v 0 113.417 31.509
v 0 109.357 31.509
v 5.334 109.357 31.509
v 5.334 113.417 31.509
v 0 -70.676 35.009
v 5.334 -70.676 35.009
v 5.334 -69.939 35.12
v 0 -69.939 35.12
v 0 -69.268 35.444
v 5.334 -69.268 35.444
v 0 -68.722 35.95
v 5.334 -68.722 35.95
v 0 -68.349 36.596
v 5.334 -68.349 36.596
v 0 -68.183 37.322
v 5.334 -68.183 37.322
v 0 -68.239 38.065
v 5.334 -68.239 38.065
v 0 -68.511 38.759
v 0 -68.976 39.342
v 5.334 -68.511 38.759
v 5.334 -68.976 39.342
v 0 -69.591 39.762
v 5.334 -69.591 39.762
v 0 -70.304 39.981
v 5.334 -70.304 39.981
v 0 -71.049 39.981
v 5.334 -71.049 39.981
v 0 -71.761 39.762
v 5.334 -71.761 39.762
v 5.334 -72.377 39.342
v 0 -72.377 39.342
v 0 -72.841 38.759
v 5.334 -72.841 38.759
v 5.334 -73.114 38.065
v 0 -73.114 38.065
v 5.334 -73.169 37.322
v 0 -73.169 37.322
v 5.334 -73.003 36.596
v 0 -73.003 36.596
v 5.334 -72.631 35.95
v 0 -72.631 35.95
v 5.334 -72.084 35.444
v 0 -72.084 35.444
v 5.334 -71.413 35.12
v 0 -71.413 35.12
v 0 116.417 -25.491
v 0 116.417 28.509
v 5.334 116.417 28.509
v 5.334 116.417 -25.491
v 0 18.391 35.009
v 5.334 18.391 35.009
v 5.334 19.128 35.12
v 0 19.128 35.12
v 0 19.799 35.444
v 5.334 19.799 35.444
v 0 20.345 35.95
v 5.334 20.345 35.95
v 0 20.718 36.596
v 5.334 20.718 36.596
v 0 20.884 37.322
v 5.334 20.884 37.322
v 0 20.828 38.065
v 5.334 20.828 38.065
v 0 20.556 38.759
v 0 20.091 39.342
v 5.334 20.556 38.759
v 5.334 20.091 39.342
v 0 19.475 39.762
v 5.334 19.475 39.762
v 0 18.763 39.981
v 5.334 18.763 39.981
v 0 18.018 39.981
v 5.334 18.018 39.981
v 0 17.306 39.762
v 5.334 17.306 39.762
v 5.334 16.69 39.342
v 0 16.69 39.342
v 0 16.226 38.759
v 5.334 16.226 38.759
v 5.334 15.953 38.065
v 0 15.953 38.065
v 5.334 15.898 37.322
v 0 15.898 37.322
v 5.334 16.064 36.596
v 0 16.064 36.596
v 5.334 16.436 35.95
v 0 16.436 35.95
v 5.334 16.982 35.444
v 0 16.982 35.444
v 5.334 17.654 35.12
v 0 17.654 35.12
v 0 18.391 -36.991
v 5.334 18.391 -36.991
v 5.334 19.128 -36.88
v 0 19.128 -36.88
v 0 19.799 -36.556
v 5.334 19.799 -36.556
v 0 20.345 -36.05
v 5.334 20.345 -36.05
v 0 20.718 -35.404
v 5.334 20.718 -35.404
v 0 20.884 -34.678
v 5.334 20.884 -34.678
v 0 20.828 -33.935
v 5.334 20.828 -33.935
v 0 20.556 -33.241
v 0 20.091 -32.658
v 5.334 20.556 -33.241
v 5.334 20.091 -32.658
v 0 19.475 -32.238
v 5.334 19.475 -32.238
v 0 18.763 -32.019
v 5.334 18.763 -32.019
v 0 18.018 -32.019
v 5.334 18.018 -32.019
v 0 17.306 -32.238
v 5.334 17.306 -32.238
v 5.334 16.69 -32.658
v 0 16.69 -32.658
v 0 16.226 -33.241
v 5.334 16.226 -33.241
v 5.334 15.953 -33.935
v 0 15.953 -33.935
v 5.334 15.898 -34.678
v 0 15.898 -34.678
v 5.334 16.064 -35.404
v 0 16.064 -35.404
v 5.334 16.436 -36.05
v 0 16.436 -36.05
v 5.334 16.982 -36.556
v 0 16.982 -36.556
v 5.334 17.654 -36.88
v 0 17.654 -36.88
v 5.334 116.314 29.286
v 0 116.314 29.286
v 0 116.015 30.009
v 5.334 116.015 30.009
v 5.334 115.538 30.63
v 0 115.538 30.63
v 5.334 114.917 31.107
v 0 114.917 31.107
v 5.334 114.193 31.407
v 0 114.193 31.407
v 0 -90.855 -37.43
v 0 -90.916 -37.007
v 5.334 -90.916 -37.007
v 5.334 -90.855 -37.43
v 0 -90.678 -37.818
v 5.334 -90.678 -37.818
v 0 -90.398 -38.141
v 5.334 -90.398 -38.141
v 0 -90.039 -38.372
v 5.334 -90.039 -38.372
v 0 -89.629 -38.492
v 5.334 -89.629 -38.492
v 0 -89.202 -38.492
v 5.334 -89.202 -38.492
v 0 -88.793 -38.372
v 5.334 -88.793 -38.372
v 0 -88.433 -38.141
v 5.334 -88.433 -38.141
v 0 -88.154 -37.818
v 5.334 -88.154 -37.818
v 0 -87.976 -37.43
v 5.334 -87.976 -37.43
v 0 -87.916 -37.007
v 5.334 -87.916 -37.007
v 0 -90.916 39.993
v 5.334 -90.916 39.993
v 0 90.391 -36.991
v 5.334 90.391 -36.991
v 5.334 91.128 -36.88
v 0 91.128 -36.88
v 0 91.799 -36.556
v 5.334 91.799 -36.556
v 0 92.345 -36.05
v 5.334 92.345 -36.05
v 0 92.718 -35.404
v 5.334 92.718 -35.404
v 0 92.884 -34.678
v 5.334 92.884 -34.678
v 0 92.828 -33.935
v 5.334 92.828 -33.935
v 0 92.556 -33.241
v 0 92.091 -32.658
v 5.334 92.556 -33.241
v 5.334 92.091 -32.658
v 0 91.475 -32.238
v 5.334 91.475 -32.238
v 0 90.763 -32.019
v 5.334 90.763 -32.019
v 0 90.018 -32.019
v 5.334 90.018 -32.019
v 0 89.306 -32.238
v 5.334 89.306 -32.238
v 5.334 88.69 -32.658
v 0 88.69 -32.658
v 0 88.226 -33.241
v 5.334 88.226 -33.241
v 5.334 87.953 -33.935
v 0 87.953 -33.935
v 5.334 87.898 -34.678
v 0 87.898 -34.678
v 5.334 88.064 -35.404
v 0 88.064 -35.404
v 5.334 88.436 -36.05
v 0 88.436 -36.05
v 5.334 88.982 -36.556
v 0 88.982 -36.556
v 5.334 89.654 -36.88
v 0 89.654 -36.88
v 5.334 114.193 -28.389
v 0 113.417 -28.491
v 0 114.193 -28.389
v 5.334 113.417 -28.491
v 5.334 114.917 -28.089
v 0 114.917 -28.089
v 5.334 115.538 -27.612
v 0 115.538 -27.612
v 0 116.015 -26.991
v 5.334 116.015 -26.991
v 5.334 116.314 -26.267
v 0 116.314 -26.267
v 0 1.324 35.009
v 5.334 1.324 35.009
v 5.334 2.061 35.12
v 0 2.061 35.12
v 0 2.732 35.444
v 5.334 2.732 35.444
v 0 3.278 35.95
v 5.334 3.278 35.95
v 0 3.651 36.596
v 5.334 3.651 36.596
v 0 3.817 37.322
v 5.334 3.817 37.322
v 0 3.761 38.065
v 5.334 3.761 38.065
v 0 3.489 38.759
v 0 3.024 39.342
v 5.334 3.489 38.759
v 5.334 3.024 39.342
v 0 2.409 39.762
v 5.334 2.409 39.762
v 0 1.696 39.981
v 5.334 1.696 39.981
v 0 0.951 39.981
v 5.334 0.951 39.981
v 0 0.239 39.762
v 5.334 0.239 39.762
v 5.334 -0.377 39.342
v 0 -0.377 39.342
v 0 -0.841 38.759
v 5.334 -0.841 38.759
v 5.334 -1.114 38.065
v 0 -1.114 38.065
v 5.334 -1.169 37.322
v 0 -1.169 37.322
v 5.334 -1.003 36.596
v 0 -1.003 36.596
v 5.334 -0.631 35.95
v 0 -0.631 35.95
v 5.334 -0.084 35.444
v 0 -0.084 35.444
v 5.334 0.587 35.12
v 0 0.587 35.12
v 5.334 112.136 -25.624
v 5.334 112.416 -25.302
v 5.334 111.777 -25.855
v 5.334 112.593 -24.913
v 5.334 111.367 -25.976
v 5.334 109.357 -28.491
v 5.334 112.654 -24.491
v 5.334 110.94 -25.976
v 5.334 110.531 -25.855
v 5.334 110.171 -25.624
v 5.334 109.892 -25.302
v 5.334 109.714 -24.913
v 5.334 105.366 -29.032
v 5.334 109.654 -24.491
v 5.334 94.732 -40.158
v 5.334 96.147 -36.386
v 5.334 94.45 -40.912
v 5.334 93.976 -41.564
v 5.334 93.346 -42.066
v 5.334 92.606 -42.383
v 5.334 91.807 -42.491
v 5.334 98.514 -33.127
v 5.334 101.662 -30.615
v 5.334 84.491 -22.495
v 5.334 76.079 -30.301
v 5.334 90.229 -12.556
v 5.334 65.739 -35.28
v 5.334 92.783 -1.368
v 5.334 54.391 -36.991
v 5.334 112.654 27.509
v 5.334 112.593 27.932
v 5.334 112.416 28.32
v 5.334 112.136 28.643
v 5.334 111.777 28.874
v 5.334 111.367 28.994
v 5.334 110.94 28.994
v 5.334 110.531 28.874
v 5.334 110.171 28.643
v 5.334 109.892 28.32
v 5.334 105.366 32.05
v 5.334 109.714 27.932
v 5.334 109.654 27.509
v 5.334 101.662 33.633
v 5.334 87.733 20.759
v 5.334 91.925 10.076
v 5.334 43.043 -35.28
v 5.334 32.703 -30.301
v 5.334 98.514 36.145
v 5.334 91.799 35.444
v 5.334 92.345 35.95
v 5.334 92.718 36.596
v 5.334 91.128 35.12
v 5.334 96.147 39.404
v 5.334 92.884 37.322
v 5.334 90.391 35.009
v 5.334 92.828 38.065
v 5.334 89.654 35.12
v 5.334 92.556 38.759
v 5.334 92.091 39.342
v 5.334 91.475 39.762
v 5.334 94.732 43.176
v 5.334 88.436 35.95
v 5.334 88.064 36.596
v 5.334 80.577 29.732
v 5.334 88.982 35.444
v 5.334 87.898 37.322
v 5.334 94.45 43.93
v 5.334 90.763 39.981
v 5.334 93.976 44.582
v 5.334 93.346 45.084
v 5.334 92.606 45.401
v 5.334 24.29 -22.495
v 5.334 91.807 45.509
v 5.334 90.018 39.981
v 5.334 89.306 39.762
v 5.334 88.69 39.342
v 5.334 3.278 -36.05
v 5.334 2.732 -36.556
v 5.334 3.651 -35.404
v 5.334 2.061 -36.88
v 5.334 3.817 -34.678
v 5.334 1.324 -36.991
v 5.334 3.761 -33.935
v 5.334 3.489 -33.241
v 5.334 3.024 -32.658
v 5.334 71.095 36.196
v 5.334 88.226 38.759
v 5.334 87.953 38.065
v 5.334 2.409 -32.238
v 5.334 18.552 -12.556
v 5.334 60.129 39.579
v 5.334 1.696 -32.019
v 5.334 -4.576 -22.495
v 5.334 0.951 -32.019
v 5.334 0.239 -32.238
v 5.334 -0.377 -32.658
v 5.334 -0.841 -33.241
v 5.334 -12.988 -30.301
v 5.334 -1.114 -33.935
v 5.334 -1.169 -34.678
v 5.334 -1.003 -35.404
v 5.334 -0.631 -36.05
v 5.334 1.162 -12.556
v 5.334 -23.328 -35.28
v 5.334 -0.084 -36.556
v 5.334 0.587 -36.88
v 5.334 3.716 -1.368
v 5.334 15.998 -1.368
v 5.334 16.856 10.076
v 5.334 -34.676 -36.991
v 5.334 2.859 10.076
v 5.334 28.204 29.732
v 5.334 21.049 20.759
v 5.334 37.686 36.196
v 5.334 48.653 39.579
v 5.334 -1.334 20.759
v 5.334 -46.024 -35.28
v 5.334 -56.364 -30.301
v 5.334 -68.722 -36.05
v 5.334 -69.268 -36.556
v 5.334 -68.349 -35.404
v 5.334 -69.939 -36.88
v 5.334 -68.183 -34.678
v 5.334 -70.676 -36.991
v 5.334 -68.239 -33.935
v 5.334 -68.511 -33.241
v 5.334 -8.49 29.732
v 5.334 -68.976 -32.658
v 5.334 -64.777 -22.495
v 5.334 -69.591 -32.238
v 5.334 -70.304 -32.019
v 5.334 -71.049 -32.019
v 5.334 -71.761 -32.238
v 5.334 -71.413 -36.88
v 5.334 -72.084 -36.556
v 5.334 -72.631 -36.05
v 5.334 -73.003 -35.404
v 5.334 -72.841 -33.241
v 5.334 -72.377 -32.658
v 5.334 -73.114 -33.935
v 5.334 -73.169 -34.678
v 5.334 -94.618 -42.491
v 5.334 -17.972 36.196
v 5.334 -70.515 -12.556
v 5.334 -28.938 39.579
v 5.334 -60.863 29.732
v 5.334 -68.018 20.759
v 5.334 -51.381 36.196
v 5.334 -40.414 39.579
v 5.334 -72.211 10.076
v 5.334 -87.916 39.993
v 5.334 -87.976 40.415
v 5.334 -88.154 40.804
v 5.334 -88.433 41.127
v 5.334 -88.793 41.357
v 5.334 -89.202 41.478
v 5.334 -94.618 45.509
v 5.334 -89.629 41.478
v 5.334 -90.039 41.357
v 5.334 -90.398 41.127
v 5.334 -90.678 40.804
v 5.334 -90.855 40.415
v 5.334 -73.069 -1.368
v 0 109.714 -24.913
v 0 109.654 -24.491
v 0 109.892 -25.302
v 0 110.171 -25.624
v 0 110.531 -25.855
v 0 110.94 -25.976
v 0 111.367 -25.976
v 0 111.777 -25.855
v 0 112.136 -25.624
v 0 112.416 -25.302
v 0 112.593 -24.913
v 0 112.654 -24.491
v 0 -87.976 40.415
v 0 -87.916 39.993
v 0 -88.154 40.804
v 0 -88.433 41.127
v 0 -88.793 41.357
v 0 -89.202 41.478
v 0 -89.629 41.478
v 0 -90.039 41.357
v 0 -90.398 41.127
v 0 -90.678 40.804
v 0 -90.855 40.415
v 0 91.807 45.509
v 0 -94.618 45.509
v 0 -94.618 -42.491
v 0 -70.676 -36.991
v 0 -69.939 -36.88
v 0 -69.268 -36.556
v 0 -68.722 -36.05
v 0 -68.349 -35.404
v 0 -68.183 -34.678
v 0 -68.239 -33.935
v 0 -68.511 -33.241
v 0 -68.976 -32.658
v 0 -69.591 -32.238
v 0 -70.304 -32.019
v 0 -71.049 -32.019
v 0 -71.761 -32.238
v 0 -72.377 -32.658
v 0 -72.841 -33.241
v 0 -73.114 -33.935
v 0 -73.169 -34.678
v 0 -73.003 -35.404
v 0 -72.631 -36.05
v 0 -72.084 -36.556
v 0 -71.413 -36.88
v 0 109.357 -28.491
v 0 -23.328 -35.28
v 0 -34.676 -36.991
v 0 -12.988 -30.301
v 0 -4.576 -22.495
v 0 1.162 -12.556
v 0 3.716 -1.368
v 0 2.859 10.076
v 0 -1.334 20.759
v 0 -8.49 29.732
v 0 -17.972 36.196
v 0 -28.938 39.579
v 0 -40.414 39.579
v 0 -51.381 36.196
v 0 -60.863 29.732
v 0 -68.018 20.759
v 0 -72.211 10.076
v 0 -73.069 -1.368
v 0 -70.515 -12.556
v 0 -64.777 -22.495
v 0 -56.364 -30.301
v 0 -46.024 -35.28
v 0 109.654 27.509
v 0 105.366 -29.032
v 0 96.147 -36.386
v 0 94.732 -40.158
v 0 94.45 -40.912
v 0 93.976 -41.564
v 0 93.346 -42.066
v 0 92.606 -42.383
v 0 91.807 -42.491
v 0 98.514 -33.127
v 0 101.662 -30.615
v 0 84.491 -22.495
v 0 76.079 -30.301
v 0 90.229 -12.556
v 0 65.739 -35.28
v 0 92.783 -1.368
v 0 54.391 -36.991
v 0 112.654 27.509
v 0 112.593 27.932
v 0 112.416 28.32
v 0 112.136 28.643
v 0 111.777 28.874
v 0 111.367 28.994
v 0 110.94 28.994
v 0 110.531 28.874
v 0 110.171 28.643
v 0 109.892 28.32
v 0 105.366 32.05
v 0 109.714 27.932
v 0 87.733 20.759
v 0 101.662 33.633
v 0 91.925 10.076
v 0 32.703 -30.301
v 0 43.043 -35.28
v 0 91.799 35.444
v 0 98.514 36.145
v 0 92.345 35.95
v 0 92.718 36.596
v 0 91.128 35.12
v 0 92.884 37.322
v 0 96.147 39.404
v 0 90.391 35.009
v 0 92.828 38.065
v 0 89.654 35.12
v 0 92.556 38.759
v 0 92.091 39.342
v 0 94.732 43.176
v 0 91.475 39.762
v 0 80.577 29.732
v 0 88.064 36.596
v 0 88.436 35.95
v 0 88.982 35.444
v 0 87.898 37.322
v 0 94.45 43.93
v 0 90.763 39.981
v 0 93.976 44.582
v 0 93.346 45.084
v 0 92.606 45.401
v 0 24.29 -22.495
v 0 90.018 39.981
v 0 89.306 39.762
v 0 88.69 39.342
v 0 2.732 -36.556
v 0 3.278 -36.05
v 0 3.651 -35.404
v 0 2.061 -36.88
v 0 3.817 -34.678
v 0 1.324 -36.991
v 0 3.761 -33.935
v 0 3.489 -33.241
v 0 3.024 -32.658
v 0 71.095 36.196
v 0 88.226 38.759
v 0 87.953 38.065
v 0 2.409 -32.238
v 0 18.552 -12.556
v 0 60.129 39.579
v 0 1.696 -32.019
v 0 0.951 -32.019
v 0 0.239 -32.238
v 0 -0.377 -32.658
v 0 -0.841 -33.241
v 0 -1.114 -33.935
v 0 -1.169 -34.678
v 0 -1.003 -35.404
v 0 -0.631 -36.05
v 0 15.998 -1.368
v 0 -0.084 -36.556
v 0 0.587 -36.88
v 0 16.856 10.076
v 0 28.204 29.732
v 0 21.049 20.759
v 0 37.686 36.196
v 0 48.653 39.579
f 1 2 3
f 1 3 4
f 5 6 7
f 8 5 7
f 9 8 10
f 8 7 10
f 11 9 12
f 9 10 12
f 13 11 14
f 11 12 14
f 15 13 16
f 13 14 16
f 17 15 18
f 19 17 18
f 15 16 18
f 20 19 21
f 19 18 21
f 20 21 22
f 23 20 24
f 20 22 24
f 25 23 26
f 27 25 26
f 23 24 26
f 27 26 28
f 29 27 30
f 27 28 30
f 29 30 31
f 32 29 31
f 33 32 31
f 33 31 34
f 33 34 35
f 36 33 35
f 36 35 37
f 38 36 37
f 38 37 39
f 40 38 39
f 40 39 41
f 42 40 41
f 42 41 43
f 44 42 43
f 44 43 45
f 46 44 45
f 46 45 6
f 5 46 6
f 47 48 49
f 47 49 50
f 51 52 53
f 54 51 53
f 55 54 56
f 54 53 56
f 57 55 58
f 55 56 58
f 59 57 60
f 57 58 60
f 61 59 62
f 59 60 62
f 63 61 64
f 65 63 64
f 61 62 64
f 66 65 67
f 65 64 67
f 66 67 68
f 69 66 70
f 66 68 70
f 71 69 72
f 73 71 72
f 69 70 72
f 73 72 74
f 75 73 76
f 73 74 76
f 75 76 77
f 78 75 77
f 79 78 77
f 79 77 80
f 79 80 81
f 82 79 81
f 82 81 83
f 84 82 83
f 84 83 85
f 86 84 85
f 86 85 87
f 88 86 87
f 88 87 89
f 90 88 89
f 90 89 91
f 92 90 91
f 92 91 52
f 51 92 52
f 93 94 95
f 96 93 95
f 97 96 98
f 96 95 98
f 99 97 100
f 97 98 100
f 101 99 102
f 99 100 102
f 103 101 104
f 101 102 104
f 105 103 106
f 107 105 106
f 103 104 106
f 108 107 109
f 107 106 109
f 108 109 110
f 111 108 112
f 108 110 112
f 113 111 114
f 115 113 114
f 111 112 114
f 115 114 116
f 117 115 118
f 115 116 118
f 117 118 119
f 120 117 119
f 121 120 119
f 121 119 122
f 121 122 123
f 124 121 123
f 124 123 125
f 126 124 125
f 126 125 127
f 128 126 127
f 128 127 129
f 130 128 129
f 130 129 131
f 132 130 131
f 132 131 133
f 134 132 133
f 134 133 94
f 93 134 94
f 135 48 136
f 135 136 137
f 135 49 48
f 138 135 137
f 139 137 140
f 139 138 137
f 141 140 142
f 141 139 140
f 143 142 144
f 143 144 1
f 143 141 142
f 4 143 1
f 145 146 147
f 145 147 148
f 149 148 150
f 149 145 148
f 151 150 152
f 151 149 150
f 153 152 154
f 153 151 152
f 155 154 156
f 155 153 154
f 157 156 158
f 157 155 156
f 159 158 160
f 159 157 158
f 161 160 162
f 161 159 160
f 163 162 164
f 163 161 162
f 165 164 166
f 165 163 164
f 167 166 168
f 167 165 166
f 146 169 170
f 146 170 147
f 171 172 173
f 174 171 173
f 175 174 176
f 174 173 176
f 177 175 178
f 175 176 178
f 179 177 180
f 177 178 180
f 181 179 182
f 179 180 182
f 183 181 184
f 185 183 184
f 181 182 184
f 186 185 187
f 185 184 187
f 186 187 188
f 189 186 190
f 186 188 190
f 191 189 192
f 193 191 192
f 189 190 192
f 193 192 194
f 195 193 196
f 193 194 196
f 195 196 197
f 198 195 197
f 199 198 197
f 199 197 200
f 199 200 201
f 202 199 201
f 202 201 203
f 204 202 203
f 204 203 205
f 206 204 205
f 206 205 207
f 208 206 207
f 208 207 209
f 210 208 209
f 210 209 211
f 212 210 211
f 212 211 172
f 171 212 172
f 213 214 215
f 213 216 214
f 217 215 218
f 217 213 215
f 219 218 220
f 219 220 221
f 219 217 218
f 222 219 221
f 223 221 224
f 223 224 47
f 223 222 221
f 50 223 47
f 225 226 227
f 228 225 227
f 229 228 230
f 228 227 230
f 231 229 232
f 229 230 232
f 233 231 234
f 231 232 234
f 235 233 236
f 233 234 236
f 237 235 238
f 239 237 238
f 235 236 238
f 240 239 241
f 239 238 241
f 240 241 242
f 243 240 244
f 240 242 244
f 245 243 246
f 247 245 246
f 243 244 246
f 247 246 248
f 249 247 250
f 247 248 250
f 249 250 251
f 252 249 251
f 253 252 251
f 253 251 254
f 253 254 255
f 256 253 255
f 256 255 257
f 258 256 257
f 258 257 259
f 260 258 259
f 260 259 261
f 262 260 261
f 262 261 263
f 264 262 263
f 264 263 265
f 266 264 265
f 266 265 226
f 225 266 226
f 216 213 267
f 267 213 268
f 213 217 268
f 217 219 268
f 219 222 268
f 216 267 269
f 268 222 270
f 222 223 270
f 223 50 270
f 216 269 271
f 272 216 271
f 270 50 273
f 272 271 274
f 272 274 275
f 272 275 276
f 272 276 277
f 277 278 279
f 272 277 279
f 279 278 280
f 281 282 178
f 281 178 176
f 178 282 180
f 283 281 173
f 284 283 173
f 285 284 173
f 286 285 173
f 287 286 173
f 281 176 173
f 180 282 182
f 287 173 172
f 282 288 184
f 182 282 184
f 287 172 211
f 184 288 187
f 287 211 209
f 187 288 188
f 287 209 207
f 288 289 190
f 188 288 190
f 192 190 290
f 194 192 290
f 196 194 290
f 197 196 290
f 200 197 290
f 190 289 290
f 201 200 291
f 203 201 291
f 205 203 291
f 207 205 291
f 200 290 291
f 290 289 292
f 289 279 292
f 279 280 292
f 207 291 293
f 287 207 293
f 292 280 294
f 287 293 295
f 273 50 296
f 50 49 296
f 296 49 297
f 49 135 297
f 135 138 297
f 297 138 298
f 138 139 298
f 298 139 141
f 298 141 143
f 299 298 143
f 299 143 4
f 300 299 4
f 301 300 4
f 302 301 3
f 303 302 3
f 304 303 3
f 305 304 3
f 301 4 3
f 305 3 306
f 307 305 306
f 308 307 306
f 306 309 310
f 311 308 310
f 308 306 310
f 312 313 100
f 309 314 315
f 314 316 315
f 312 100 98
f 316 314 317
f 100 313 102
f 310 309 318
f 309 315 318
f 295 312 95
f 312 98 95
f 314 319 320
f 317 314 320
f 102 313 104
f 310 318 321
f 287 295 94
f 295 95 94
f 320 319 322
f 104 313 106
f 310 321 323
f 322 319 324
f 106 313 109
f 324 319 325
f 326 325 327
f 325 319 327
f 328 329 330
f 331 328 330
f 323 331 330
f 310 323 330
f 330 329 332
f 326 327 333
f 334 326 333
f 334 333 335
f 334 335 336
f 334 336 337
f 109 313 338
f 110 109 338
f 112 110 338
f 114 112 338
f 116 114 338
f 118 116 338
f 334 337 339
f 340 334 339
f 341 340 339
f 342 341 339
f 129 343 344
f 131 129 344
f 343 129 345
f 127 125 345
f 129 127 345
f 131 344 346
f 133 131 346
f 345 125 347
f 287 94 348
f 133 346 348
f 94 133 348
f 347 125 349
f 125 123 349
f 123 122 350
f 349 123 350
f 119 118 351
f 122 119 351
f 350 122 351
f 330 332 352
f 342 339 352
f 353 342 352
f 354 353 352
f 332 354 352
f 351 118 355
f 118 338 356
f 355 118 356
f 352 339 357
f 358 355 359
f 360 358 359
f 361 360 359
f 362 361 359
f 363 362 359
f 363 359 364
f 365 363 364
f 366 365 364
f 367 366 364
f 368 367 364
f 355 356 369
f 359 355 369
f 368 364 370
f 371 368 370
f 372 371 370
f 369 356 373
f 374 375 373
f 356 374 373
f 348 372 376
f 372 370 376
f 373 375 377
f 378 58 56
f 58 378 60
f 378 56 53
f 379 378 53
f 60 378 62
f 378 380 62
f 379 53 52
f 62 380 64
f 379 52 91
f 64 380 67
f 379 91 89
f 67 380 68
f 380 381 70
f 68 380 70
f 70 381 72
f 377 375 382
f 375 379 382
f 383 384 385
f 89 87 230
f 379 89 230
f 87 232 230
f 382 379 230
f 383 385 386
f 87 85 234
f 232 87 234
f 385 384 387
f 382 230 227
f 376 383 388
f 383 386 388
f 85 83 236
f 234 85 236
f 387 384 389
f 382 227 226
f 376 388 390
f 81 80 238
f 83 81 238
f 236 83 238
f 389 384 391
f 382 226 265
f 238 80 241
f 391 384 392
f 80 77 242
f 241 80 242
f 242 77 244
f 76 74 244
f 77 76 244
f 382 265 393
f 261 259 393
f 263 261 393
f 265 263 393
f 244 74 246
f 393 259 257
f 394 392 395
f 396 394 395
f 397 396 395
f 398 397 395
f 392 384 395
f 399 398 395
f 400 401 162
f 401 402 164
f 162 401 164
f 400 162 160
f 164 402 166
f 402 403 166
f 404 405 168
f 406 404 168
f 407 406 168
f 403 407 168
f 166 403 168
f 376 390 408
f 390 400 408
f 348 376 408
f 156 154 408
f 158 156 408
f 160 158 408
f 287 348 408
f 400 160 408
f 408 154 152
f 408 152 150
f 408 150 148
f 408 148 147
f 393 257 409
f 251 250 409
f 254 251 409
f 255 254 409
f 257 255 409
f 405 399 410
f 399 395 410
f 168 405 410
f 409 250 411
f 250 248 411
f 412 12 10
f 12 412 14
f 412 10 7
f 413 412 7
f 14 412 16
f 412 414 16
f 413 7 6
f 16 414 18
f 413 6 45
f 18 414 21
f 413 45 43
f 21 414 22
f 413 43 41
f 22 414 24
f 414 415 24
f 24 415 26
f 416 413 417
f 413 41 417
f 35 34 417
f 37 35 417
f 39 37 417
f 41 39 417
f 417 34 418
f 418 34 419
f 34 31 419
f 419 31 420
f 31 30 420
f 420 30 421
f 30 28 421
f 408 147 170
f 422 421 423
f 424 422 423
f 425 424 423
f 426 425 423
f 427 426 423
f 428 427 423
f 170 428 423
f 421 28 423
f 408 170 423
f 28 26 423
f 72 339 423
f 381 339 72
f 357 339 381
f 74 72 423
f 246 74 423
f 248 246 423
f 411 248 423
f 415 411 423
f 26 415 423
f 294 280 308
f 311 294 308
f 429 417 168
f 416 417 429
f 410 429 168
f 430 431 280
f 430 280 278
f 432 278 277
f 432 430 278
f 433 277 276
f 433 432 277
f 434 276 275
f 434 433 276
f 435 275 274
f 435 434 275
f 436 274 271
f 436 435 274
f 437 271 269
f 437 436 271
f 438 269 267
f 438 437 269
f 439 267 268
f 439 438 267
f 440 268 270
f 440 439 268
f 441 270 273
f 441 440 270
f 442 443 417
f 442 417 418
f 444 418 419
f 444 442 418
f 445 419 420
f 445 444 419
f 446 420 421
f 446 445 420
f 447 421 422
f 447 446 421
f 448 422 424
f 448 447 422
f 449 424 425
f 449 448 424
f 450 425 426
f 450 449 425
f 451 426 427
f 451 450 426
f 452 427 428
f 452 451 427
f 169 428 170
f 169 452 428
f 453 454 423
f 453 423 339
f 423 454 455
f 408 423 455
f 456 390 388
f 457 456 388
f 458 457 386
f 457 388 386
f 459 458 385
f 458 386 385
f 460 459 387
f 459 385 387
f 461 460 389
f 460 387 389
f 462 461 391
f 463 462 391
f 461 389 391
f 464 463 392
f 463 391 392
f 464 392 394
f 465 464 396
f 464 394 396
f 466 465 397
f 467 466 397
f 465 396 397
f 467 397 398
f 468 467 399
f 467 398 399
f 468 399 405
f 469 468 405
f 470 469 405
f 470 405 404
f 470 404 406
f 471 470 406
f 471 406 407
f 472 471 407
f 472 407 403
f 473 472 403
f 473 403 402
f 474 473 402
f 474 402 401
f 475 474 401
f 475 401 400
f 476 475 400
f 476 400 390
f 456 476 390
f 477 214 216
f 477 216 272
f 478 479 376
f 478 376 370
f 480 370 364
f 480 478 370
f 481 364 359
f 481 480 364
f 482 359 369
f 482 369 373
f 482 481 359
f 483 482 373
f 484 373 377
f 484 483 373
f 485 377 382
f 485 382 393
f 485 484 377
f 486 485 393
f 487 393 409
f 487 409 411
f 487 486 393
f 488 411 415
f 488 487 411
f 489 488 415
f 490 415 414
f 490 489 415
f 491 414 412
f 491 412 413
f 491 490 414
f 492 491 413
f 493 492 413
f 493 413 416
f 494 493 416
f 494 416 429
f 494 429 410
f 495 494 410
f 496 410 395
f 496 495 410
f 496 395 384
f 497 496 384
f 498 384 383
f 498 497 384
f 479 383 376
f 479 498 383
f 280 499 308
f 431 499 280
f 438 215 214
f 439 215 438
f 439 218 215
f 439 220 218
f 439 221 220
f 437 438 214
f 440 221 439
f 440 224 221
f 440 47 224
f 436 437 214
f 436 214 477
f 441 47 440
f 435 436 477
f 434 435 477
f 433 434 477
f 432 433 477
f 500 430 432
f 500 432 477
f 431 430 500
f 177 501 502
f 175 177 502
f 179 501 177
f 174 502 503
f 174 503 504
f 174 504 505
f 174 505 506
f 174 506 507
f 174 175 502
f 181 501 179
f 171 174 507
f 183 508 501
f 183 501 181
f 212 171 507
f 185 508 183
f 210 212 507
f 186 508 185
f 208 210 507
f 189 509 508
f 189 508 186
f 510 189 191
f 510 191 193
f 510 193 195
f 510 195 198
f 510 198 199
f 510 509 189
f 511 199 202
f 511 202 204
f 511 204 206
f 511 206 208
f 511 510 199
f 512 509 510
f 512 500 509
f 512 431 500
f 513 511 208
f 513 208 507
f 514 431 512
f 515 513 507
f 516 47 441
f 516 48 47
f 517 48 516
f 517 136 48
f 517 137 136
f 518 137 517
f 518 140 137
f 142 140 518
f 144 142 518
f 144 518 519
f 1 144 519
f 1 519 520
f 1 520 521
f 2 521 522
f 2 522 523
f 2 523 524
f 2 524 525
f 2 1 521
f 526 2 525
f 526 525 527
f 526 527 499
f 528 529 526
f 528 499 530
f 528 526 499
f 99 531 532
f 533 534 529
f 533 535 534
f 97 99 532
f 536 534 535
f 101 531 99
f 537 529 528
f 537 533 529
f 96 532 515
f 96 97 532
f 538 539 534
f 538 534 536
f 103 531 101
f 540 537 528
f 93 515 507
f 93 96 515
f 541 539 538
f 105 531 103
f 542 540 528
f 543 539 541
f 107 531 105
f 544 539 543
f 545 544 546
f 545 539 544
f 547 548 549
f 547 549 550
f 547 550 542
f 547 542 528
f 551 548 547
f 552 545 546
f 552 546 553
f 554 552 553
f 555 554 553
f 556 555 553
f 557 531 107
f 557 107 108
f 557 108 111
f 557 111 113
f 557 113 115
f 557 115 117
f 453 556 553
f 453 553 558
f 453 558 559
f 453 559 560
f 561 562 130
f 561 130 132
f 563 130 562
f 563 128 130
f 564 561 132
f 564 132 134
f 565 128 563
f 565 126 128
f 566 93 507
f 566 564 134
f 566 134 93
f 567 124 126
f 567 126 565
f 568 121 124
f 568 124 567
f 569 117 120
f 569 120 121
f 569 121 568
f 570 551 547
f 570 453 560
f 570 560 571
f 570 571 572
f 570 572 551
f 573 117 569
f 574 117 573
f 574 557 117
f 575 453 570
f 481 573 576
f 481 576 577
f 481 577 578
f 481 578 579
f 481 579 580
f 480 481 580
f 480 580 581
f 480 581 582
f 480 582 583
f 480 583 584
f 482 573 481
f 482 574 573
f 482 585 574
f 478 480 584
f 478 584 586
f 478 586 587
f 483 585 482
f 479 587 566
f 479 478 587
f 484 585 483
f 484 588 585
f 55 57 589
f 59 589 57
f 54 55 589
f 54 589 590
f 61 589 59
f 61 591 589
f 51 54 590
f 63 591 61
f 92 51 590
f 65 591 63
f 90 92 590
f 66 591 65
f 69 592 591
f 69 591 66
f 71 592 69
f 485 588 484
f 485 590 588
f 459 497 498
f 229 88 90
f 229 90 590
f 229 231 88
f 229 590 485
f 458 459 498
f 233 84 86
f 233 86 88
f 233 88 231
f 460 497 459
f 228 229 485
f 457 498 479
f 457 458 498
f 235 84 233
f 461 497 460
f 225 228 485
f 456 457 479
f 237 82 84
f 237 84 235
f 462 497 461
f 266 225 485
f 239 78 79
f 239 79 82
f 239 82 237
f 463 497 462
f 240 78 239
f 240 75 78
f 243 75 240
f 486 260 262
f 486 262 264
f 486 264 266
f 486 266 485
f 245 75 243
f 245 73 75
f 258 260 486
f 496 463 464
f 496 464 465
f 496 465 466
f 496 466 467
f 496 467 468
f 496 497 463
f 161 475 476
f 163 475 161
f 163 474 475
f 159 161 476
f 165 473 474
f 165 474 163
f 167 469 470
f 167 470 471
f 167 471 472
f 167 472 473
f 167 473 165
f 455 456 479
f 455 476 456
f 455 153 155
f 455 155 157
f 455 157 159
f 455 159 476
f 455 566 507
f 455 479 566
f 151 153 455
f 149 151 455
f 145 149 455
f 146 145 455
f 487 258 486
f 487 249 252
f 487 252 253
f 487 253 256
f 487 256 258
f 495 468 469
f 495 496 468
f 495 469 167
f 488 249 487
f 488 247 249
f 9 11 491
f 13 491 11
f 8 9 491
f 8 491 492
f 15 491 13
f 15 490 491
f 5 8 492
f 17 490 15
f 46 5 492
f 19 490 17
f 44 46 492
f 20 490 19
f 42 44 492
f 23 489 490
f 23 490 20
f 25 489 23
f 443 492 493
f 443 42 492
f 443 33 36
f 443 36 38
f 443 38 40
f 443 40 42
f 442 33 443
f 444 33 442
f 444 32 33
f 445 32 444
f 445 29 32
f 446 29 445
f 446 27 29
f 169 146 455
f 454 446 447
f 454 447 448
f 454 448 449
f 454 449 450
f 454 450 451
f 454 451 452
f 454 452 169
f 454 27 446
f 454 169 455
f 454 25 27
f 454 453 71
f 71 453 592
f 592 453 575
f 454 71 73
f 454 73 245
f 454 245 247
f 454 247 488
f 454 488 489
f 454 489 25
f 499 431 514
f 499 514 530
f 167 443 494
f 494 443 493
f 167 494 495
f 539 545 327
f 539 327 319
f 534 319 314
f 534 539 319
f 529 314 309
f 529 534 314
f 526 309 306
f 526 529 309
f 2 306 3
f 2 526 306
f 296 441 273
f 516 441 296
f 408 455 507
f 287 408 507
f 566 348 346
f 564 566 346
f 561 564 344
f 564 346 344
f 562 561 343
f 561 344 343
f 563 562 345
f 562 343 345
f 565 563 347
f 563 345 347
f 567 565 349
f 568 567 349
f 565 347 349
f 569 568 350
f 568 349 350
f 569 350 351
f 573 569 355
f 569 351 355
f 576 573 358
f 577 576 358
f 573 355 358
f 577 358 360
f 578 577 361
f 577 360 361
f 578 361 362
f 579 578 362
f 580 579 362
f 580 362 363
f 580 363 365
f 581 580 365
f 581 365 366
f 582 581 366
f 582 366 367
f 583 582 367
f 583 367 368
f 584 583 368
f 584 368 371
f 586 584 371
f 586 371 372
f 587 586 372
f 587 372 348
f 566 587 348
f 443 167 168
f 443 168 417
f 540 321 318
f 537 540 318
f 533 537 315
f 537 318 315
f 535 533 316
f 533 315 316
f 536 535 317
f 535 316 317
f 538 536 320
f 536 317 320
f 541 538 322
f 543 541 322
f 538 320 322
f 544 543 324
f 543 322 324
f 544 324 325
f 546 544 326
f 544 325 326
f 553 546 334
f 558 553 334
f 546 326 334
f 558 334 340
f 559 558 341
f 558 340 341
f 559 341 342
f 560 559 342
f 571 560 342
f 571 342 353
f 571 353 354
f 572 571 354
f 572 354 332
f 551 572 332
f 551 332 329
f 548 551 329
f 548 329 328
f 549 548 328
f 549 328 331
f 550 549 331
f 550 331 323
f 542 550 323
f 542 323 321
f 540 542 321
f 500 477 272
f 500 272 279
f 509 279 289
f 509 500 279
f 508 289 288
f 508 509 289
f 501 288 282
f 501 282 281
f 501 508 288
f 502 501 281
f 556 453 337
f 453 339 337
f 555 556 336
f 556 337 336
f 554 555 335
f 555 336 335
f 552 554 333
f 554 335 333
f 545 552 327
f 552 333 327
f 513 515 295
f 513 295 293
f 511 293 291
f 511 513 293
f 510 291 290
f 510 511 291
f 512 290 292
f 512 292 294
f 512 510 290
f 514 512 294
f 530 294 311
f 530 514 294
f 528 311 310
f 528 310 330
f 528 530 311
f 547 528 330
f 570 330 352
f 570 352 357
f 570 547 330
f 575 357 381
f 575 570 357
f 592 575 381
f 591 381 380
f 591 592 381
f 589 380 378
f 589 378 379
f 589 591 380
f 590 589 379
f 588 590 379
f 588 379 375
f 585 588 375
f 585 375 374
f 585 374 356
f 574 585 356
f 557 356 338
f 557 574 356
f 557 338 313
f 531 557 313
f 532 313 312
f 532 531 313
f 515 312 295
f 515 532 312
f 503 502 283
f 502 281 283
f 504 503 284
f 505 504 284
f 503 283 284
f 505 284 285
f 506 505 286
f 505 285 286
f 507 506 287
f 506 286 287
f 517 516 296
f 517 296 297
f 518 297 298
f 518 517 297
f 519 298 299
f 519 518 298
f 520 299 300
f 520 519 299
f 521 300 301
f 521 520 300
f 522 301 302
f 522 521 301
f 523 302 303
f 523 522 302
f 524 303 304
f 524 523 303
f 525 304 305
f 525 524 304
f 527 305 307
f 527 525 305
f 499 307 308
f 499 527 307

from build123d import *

# Parameters (mm, degrees)
SKETCH2_R                 = 38.5
SKETCH2_W                 = 4
SKETCH2_H                 = 189.008661332
BOSS_EXTRUDE2_DEPTH       = 5.334
F_3_0MM_DOWEL_SLOT1_DEPTH = 5.334
F_3_0MM_DOWEL_SLOT2_DEPTH = 5.334
FILLET1_R                 = 15
FILLET2_R                 = 3
F_5_0MM_DOWEL_HOLE1_D     = 5


# Read off the part's stored shape, not the designer's step: Ø3.0mm Dowel Slot1, Ø3.0mm Dowel Slot2
with BuildPart() as part:
    # Sketch2 → Boss-Extrude2 (new body)
    # profile 1 of 3: a face of its own
    with BuildSketch(Plane(origin=(0, 0, 0), x_dir=(0, 0, -1), z_dir=(1, 0, 0))):
        Polygon((28.490859753, 116.416616863), (28.490859753, 94.390736923), (38.490859753, 94.390736923), (38.490859753, -94.617924409), (-41.509140247, -94.617924409), (-41.509140247, 94.390736923), (-31.509140247, 94.390736923), (-31.509140247, 116.416616863), align=None)
        with Locations((-1.509140247, 54.390736923)):
            Circle(SKETCH2_R, mode=Mode.SUBTRACT)
        with Locations((-1.509140247, -34.676182382)):
            Circle(SKETCH2_R, mode=Mode.SUBTRACT)
    # profile 2 of 3: a face of its own
    with BuildSketch(Plane(origin=(0, 0, 0), x_dir=(0, 0, -1), z_dir=(1, 0, 0))):
        with Locations((-43.509140247, -0.113593743)):
            Rectangle(SKETCH2_W, SKETCH2_H)
    # profile 3 of 3: a face of its own
    with BuildSketch(Plane(origin=(0, 0, 0), x_dir=(0, 0, -1), z_dir=(1, 0, 0))):
        with Locations((40.490859753, -0.113593743)):
            Rectangle(SKETCH2_W, SKETCH2_H)
    extrude(amount=BOSS_EXTRUDE2_DEPTH)

    # Ø3.0mm Dowel Slot1 outline → Ø3.0mm Dowel Slot1 (cut)
    with BuildSketch(Plane.YZ):
        with BuildLine():
            ThreePointArc((-87.91563933, 39.992900247), (-89.41563933, 41.492900247), (-90.91563933, 39.992900247))
            Line((-90.91563933, 39.992900247), (-90.91563933, -37.007099753))
            ThreePointArc((-90.91563933, -37.007099753), (-89.41563933, -38.507099753), (-87.91563933, -37.007099753))
            Line((-87.91563933, -37.007099753), (-87.91563933, 39.992900247))
        make_face()
    extrude(amount=F_3_0MM_DOWEL_SLOT1_DEPTH, mode=Mode.SUBTRACT)

    # Ø3.0mm Dowel Slot2 outline → Ø3.0mm Dowel Slot2 (cut)
    with BuildSketch(Plane.YZ):
        with BuildLine():
            ThreePointArc((112.653676893, 27.509140247), (111.153676893, 29.009140247), (109.653676893, 27.509140247))
            Line((109.653676893, 27.509140247), (109.653676893, -24.490859753))
            ThreePointArc((109.653676893, -24.490859753), (111.153676893, -25.990859753), (112.653676893, -24.490859753))
            Line((112.653676893, -24.490859753), (112.653676893, 27.509140247))
        make_face()
    extrude(amount=F_3_0MM_DOWEL_SLOT2_DEPTH, mode=Mode.SUBTRACT)

    # Fillet1
    # the kernel refuses this fillet: 15 mm, written as the material it adds along each edge
    with BuildSketch(Plane(origin=(0, 94.390736923, 31.509140247), x_dir=(0, 1, 0), z_dir=(1, 0, 0))) as fillet1_piece_1:
        with BuildLine():
            CenterArc((14.966629547, 15), FILLET1_R, 183.822553729, 86.177446271)
            Line((0, 14), (-0.299332591, 13.98))
            ThreePointArc((-0.299332591, 13.98), (-0.3, 7), (-0.3, 0))
            Line((-0.3, 0), (0, -0.3))
            Line((0, -0.3), (14.966629547, -0.3))
            Line((14.966629547, -0.3), (14.966629547, 0))
        make_face()
    extrude(amount=5.334)
    with BuildSketch(Plane(origin=(0, 94.390736923, -28.490859753), x_dir=(0, 1, 0), z_dir=(1, 0, 0))) as fillet1_piece_2:
        with BuildLine():
            CenterArc((14.966629547, -15), FILLET1_R, 90, 86.177446271)
            Line((0, -14), (-0.299332591, -13.98))
            ThreePointArc((-0.299332591, -13.98), (-0.3, -7), (-0.3, 0))
            Line((-0.3, 0), (0, 0.3))
            Line((0, 0.3), (14.966629547, 0.3))
            Line((14.966629547, 0.3), (14.966629547, 0))
        make_face()
    extrude(amount=5.334)

    # Fillet2
    fillet2_edges = [part.edges().sort_by_distance(p)[0] for p in [
        (2.667, 94.390736923, -42.490859753),
        (2.667, 94.390736923, 45.509140247),
        (2.667, 116.416616863, 31.509140247),
        (2.667, 116.416616863, -28.490859753),
    ]]
    fillet(fillet2_edges, radius=FILLET2_R)

    # Ø5.0mm Dowel Hole1 (through all)
    with Locations(Plane.ZY):
        with Locations((-34.490859753, 90.390736923), (37.509140247, 90.390736923), (-34.490859753, 18.390736923), (37.509140247, 18.390736923), (37.509140247, 1.323817618), (-34.490859753, 1.323817618), (-34.490859753, -70.676182382), (37.509140247, -70.676182382)):
            Hole(F_5_0MM_DOWEL_HOLE1_D / 2)


solid = part.part
